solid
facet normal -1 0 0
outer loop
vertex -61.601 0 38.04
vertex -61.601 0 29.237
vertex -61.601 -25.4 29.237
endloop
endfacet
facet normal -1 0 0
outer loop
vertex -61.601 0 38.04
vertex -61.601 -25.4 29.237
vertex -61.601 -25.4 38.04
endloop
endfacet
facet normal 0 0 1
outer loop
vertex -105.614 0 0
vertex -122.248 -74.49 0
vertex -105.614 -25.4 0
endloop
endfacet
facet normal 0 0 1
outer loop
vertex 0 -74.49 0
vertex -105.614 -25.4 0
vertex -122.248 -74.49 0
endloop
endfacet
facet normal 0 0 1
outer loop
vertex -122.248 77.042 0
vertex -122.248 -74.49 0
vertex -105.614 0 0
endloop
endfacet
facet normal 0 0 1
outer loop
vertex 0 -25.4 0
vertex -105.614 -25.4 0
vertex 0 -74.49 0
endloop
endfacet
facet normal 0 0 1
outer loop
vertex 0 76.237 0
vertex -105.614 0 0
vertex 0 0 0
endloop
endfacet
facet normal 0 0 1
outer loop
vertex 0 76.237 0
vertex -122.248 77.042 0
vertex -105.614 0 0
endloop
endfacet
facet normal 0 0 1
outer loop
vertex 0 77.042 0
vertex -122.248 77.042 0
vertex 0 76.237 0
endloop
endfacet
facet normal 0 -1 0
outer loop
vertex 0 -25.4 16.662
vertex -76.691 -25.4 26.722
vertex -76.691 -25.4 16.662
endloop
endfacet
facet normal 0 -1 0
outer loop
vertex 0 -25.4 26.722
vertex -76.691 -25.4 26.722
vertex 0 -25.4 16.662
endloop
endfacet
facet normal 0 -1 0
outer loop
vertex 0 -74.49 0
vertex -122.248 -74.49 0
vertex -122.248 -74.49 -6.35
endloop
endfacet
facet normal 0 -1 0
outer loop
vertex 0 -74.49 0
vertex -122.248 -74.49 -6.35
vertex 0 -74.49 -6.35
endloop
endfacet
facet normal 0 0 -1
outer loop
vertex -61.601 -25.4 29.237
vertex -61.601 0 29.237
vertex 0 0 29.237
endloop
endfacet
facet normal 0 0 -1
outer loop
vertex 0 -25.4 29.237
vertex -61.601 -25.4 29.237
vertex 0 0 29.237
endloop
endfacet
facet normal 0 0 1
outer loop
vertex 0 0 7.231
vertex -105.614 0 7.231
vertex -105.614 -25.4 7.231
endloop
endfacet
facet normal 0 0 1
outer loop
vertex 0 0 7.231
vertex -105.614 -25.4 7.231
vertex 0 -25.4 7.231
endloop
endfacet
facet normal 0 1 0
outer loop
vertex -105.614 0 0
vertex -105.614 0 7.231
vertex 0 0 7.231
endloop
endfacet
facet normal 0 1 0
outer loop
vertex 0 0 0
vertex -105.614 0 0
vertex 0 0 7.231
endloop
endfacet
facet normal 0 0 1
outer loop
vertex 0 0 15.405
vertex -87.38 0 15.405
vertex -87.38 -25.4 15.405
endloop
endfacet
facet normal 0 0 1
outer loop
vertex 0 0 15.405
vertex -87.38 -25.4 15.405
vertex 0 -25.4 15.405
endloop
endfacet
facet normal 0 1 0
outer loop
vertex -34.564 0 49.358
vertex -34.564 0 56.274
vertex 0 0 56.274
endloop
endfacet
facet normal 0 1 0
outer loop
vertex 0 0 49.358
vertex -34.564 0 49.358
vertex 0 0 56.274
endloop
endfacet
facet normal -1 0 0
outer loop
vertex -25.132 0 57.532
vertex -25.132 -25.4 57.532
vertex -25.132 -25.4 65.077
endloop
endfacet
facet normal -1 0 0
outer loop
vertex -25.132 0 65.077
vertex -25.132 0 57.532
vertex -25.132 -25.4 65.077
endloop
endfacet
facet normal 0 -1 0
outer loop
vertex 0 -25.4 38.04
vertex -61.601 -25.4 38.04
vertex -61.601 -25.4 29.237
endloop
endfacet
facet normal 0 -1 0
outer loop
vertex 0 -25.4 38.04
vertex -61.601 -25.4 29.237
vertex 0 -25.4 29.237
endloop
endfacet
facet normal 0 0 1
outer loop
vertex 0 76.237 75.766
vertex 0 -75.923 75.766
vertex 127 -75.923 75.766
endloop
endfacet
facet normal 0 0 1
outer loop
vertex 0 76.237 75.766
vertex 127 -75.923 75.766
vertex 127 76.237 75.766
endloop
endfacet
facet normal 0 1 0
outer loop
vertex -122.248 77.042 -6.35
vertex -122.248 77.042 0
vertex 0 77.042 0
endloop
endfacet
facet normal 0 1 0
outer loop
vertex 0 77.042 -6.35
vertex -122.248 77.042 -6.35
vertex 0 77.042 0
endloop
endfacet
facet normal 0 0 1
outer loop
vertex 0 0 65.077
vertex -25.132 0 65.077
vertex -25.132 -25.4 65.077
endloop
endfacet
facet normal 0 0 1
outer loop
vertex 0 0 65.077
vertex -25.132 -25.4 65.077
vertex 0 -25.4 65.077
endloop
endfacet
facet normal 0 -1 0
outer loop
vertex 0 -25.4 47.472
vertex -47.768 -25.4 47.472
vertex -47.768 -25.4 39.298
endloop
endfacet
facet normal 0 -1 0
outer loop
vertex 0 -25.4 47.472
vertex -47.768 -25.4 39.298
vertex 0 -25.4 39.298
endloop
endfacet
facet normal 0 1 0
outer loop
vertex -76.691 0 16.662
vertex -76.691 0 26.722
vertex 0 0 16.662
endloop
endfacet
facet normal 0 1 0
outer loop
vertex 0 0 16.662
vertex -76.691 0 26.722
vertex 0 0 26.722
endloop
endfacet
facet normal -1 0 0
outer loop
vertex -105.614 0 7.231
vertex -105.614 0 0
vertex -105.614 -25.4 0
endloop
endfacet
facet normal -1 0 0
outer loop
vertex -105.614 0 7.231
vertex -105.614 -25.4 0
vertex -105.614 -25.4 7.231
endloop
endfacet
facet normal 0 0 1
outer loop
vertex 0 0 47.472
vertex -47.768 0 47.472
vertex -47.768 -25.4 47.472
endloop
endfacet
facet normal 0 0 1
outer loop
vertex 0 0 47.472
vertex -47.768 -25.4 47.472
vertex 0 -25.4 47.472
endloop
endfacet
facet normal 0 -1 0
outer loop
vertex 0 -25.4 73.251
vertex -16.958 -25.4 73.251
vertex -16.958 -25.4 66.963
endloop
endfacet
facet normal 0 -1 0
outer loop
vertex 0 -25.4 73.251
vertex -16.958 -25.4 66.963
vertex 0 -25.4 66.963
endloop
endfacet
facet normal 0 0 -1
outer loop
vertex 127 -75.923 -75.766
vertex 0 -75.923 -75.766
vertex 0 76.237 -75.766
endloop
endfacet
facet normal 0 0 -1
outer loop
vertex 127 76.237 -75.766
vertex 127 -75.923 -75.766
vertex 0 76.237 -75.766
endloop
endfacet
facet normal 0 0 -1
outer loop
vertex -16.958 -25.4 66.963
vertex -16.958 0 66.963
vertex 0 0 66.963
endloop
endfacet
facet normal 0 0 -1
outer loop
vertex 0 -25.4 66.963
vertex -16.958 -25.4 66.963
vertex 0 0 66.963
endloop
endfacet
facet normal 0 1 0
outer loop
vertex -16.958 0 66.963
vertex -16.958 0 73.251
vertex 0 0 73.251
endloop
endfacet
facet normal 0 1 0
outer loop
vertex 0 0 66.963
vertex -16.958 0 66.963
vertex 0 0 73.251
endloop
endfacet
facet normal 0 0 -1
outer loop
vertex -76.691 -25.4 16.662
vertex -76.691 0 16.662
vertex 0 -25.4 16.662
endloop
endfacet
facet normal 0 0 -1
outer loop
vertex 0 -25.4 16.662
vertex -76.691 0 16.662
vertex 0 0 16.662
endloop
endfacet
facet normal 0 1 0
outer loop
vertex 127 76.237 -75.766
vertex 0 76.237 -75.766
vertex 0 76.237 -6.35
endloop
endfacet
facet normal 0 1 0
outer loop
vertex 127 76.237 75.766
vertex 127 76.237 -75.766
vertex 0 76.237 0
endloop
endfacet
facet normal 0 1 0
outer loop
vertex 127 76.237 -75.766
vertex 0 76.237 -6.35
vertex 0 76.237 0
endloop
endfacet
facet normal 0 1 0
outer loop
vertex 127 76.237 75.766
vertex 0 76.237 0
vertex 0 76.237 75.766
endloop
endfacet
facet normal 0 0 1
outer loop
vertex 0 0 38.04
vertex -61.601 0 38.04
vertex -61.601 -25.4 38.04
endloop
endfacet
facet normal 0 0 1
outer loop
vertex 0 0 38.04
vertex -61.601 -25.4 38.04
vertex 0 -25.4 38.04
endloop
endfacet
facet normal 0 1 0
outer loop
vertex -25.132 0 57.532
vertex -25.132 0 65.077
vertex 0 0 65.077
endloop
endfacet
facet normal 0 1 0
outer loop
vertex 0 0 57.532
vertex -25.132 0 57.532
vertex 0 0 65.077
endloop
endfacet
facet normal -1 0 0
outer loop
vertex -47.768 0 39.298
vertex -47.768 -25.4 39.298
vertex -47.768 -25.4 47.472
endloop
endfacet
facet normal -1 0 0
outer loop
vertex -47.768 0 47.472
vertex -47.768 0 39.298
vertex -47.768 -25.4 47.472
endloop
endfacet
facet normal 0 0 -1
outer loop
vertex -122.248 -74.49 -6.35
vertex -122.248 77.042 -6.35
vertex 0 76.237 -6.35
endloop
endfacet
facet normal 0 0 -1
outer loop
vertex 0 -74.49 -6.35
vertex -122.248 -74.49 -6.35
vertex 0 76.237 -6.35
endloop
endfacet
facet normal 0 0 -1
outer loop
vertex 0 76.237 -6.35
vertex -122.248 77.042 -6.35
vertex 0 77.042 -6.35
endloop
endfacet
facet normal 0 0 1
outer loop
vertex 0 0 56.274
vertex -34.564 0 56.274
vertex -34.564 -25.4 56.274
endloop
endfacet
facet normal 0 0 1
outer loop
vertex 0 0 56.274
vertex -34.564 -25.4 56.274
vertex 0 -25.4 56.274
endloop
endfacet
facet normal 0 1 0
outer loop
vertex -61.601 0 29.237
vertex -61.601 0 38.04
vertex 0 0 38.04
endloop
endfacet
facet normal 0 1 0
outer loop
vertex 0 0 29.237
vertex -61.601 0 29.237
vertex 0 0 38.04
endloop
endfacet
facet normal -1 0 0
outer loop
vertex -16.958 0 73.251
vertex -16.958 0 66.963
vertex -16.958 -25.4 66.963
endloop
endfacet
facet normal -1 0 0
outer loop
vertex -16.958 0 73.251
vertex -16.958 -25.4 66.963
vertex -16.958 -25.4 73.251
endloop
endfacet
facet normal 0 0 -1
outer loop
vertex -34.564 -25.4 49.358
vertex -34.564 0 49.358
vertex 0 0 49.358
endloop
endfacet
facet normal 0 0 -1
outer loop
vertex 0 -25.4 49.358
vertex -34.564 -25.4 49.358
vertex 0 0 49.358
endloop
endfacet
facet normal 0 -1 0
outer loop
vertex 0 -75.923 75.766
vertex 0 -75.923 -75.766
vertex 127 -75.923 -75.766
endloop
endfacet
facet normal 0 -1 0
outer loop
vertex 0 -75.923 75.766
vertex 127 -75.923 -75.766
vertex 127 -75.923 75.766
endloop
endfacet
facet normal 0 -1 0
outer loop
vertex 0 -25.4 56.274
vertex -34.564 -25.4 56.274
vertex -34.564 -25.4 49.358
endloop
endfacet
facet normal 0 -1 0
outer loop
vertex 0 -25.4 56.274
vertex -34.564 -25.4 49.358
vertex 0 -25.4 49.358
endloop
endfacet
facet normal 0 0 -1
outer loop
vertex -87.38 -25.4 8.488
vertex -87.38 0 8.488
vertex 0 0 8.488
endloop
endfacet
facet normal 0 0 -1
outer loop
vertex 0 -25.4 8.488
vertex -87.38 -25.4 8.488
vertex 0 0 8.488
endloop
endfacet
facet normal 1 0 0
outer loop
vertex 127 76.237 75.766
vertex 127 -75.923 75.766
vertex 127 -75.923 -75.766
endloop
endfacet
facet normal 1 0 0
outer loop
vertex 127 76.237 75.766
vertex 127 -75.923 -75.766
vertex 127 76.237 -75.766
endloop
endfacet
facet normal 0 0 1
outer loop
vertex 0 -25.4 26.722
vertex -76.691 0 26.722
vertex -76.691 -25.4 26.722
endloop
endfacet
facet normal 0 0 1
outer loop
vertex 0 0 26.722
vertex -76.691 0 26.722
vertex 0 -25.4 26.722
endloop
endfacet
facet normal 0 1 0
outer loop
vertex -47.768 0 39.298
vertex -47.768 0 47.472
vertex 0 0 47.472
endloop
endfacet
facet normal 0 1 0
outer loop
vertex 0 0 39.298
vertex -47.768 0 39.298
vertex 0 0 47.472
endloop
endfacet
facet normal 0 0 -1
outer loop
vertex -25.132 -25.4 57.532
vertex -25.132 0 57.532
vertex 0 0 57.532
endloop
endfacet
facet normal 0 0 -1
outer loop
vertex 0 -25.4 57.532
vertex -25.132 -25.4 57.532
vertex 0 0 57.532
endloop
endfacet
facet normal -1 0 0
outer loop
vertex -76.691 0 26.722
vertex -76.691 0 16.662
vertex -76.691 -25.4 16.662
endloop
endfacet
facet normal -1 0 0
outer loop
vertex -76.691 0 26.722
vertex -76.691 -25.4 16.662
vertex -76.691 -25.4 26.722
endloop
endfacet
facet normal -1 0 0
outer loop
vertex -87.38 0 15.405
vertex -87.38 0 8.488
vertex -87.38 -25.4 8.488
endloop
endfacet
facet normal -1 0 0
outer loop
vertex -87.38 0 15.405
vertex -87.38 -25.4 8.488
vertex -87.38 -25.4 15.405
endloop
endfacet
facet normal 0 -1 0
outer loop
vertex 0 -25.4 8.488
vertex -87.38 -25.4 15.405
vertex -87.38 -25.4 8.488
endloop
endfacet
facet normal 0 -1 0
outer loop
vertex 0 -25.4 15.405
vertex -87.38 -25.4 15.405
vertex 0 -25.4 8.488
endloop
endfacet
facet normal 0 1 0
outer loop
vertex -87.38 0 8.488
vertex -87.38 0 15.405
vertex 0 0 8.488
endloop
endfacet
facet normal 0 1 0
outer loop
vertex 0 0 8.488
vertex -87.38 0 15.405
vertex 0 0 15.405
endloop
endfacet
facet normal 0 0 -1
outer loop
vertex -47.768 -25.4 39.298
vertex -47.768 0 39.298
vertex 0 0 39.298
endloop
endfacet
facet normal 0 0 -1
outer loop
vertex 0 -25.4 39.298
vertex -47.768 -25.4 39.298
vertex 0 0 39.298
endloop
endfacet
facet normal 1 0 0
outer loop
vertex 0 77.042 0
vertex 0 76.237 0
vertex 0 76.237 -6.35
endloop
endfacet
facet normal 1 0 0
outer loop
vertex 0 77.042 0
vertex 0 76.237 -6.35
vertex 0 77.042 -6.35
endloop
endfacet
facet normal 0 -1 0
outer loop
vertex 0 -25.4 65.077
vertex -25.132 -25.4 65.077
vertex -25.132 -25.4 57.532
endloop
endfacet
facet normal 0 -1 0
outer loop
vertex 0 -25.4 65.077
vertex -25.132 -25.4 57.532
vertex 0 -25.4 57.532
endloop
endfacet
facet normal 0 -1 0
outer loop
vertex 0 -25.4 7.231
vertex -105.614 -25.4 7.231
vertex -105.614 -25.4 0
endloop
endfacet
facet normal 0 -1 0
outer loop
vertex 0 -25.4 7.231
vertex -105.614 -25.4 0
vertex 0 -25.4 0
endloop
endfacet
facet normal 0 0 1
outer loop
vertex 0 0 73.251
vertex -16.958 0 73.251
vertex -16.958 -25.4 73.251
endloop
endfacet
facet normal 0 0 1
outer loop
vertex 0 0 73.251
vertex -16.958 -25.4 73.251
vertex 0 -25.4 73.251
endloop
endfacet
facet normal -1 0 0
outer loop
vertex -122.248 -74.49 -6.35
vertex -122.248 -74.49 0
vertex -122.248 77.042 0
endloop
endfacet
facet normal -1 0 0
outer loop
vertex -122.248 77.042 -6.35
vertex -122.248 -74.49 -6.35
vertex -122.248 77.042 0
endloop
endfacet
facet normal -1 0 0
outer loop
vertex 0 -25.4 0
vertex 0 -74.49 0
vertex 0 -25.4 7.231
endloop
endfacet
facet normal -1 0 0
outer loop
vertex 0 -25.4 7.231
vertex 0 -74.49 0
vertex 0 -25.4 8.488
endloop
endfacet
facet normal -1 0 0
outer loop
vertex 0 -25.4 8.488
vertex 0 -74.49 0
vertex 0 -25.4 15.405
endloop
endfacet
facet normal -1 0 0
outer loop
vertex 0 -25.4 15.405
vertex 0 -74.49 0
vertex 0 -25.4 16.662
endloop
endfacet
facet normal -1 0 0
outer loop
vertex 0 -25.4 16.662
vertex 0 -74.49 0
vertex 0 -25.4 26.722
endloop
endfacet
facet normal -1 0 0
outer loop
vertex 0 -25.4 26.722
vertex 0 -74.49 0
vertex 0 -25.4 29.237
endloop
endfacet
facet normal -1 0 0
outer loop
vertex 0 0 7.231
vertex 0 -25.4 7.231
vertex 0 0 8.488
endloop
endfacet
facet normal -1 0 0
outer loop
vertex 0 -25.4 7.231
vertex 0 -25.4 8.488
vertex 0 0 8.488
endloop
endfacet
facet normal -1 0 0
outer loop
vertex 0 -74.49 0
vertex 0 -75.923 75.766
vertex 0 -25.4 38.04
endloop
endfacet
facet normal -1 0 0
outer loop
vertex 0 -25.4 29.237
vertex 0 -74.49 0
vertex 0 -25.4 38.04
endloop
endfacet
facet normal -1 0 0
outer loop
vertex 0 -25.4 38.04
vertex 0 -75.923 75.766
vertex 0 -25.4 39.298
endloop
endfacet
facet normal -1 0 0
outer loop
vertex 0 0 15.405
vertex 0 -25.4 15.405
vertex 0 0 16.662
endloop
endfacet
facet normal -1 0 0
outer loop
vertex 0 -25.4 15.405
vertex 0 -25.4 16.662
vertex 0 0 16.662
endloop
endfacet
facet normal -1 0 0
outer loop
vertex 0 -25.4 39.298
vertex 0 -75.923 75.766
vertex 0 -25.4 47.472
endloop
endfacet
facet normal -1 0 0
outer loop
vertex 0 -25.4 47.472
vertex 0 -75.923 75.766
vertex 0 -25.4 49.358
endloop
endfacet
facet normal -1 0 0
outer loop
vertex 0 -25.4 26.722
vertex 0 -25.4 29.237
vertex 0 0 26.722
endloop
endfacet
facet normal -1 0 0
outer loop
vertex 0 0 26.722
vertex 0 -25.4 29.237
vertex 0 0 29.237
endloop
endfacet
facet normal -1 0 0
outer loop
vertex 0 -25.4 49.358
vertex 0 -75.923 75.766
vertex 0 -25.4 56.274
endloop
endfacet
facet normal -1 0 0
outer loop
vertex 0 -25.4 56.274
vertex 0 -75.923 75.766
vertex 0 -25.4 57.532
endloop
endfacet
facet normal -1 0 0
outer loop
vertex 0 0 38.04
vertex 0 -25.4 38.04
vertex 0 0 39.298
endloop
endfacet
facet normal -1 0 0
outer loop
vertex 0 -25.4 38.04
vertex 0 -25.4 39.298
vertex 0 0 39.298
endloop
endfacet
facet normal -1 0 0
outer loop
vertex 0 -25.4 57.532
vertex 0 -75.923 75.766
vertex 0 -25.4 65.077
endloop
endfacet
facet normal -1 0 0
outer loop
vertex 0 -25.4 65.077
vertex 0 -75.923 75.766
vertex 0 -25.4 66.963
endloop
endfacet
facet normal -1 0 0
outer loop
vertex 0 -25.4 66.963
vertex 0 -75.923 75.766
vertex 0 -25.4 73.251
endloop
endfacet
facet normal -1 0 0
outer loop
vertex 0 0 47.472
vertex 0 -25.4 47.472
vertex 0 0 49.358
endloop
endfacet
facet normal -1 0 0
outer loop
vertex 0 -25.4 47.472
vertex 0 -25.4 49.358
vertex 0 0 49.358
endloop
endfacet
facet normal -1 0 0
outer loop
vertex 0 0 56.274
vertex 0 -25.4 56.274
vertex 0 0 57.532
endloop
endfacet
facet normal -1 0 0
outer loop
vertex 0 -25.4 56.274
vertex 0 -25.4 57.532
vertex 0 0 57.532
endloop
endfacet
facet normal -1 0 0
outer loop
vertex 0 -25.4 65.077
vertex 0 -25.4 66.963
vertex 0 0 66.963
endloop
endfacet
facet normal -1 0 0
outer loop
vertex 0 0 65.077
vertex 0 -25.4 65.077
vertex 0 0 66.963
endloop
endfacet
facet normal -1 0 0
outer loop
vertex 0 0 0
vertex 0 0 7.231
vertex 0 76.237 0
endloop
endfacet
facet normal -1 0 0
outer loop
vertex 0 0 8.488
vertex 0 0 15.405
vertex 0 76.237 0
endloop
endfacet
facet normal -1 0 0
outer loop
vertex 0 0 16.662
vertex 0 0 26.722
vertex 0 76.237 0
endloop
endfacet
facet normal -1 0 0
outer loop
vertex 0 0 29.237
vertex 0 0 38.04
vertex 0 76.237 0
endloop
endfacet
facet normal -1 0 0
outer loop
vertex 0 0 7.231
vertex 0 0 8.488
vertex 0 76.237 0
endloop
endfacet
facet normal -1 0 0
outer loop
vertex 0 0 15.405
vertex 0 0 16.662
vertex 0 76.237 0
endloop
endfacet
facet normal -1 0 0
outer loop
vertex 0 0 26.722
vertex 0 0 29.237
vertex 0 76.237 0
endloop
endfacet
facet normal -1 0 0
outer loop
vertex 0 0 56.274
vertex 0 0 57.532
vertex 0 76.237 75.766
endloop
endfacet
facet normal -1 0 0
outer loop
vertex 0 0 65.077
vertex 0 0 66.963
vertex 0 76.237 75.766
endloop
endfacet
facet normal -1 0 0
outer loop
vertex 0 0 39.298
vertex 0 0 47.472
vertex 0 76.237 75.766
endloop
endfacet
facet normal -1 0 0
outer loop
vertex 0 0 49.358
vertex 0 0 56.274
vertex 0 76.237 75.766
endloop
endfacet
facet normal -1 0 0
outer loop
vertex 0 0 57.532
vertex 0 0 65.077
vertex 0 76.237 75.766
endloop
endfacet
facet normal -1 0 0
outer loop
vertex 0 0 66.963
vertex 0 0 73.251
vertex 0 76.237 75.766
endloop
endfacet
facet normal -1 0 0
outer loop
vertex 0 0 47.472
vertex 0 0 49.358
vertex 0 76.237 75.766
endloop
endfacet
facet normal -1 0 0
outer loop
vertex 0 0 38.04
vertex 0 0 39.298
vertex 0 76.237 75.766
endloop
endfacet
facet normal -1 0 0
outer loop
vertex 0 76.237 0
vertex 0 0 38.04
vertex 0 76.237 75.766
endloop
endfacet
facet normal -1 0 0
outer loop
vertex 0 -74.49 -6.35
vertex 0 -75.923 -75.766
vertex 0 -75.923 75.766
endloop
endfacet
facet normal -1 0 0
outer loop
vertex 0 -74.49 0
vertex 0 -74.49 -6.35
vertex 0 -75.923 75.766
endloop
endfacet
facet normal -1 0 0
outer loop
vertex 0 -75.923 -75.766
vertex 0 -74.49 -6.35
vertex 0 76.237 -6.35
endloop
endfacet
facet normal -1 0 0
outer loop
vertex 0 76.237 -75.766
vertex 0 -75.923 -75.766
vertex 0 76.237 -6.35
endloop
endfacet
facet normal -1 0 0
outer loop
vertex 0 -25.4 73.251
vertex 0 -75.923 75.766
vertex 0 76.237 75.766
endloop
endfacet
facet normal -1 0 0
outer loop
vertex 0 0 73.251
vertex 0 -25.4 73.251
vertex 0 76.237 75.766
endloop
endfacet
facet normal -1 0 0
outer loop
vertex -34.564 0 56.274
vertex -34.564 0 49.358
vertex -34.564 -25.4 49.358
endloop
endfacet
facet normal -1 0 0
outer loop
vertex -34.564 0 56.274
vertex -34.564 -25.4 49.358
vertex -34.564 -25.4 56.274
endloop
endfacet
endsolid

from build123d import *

# Parameters (mm, degrees)
F0_W      = 152.1604731679
F0_H      = 151.5317112207
F1_DEPTH  = 127
F2_DEPTH  = 101.6
F4_W      = 122.2480982542
F4_H      = 151.5317037702
F5_DEPTH  = 6.35
F6_W      = 105.6139692664
F6_H      = 7.2307661176
F7_DEPTH  = 25.4
F8_W      = 87.3798653483
F8_H      = 6.916385144
F9_DEPTH  = 25.4
F11_W     = 61.6006106138
F11_H     = 8.8026728481
F12_DEPTH = 25.4
F13_W     = 47.7678403258
F13_H     = 8.1739090383
F14_DEPTH = 25.4
F15_W     = 34.563831985
F15_H     = 6.916385144
F16_DEPTH = 25.4
F17_W     = 25.1323971897
F17_H     = 7.5451470912
F18_DEPTH = 25.4
F19_W     = 16.9584862888
F19_H     = 6.2876269221
F20_DEPTH = 25.4
F10_W     = 76.6909047961
F10_H     = 10.0601967424
F21_DEPTH = 25.4


with BuildPart() as f1:
    # F0 (on Right) → F1 (new body)
    with BuildSketch(Plane.YZ):
        with Locations((0.1571886241, 0)):
            Rectangle(F0_W, F0_H)
    extrude(amount=F1_DEPTH)


with BuildPart() as f2:
    # F2 (new): a face of the model
    f2_faces = [f1.part.faces().sort_by_distance(p)[0] for p in [
        (63.5, -75.9230479598, 0),
    ]]
    extrude(f2_faces, amount=F2_DEPTH)


with BuildPart() as f1_1:
    add(f1.part)

    # F4 (on Top) → F5 (join)
    with BuildSketch(Plane.XY):
        with Locations((-61.1240491271, 1.2762360275)):
            Rectangle(F4_W, F4_H)
    extrude(amount=-F5_DEPTH)

    # F6 (on Front) → F7 (join)
    with BuildSketch(Plane.XZ):
        with Locations((-52.8069846332, 3.6153830588)):
            Rectangle(F6_W, F6_H)
    extrude(amount=F7_DEPTH)

    # F8 (on Front) → F9 (join)
    with BuildSketch(Plane.XZ):
        with Locations((-43.6899326742, 11.9464835152)):
            Rectangle(F8_W, F8_H)
    extrude(amount=F9_DEPTH)

    # F11 (on Front) → F12 (join)
    with BuildSketch(Plane.XZ):
        with Locations((-30.8003053069, 33.6387837306)):
            Rectangle(F11_W, F11_H)
    extrude(amount=F12_DEPTH)

    # F13 (on Front) → F14 (join)
    with BuildSketch(Plane.XZ):
        with Locations((-23.8839201629, 43.3845985681)):
            Rectangle(F13_W, F13_H)
    extrude(amount=F14_DEPTH)

    # F15 (on Front) → F16 (join)
    with BuildSketch(Plane.XZ):
        with Locations((-17.2819159925, 52.8160315007)):
            Rectangle(F15_W, F15_H)
    extrude(amount=F16_DEPTH)

    # F17 (on Front) → F18 (join)
    with BuildSketch(Plane.XZ):
        with Locations((-12.5661985949, 61.3043215126)):
            Rectangle(F17_W, F17_H)
    extrude(amount=F18_DEPTH)

    # F19 (on Front) → F20 (join)
    with BuildSketch(Plane.XZ):
        with Locations((-8.4792431444, 70.1069943607)):
            Rectangle(F19_W, F19_H)
    extrude(amount=F20_DEPTH)

    # F10 (on Front) → F21 (join)
    with BuildSketch(Plane.XZ):
        with Locations((-38.3454523981, 21.692299284)):
            Rectangle(F10_W, F10_H)
    extrude(amount=F21_DEPTH)


solid = f1_1.part
